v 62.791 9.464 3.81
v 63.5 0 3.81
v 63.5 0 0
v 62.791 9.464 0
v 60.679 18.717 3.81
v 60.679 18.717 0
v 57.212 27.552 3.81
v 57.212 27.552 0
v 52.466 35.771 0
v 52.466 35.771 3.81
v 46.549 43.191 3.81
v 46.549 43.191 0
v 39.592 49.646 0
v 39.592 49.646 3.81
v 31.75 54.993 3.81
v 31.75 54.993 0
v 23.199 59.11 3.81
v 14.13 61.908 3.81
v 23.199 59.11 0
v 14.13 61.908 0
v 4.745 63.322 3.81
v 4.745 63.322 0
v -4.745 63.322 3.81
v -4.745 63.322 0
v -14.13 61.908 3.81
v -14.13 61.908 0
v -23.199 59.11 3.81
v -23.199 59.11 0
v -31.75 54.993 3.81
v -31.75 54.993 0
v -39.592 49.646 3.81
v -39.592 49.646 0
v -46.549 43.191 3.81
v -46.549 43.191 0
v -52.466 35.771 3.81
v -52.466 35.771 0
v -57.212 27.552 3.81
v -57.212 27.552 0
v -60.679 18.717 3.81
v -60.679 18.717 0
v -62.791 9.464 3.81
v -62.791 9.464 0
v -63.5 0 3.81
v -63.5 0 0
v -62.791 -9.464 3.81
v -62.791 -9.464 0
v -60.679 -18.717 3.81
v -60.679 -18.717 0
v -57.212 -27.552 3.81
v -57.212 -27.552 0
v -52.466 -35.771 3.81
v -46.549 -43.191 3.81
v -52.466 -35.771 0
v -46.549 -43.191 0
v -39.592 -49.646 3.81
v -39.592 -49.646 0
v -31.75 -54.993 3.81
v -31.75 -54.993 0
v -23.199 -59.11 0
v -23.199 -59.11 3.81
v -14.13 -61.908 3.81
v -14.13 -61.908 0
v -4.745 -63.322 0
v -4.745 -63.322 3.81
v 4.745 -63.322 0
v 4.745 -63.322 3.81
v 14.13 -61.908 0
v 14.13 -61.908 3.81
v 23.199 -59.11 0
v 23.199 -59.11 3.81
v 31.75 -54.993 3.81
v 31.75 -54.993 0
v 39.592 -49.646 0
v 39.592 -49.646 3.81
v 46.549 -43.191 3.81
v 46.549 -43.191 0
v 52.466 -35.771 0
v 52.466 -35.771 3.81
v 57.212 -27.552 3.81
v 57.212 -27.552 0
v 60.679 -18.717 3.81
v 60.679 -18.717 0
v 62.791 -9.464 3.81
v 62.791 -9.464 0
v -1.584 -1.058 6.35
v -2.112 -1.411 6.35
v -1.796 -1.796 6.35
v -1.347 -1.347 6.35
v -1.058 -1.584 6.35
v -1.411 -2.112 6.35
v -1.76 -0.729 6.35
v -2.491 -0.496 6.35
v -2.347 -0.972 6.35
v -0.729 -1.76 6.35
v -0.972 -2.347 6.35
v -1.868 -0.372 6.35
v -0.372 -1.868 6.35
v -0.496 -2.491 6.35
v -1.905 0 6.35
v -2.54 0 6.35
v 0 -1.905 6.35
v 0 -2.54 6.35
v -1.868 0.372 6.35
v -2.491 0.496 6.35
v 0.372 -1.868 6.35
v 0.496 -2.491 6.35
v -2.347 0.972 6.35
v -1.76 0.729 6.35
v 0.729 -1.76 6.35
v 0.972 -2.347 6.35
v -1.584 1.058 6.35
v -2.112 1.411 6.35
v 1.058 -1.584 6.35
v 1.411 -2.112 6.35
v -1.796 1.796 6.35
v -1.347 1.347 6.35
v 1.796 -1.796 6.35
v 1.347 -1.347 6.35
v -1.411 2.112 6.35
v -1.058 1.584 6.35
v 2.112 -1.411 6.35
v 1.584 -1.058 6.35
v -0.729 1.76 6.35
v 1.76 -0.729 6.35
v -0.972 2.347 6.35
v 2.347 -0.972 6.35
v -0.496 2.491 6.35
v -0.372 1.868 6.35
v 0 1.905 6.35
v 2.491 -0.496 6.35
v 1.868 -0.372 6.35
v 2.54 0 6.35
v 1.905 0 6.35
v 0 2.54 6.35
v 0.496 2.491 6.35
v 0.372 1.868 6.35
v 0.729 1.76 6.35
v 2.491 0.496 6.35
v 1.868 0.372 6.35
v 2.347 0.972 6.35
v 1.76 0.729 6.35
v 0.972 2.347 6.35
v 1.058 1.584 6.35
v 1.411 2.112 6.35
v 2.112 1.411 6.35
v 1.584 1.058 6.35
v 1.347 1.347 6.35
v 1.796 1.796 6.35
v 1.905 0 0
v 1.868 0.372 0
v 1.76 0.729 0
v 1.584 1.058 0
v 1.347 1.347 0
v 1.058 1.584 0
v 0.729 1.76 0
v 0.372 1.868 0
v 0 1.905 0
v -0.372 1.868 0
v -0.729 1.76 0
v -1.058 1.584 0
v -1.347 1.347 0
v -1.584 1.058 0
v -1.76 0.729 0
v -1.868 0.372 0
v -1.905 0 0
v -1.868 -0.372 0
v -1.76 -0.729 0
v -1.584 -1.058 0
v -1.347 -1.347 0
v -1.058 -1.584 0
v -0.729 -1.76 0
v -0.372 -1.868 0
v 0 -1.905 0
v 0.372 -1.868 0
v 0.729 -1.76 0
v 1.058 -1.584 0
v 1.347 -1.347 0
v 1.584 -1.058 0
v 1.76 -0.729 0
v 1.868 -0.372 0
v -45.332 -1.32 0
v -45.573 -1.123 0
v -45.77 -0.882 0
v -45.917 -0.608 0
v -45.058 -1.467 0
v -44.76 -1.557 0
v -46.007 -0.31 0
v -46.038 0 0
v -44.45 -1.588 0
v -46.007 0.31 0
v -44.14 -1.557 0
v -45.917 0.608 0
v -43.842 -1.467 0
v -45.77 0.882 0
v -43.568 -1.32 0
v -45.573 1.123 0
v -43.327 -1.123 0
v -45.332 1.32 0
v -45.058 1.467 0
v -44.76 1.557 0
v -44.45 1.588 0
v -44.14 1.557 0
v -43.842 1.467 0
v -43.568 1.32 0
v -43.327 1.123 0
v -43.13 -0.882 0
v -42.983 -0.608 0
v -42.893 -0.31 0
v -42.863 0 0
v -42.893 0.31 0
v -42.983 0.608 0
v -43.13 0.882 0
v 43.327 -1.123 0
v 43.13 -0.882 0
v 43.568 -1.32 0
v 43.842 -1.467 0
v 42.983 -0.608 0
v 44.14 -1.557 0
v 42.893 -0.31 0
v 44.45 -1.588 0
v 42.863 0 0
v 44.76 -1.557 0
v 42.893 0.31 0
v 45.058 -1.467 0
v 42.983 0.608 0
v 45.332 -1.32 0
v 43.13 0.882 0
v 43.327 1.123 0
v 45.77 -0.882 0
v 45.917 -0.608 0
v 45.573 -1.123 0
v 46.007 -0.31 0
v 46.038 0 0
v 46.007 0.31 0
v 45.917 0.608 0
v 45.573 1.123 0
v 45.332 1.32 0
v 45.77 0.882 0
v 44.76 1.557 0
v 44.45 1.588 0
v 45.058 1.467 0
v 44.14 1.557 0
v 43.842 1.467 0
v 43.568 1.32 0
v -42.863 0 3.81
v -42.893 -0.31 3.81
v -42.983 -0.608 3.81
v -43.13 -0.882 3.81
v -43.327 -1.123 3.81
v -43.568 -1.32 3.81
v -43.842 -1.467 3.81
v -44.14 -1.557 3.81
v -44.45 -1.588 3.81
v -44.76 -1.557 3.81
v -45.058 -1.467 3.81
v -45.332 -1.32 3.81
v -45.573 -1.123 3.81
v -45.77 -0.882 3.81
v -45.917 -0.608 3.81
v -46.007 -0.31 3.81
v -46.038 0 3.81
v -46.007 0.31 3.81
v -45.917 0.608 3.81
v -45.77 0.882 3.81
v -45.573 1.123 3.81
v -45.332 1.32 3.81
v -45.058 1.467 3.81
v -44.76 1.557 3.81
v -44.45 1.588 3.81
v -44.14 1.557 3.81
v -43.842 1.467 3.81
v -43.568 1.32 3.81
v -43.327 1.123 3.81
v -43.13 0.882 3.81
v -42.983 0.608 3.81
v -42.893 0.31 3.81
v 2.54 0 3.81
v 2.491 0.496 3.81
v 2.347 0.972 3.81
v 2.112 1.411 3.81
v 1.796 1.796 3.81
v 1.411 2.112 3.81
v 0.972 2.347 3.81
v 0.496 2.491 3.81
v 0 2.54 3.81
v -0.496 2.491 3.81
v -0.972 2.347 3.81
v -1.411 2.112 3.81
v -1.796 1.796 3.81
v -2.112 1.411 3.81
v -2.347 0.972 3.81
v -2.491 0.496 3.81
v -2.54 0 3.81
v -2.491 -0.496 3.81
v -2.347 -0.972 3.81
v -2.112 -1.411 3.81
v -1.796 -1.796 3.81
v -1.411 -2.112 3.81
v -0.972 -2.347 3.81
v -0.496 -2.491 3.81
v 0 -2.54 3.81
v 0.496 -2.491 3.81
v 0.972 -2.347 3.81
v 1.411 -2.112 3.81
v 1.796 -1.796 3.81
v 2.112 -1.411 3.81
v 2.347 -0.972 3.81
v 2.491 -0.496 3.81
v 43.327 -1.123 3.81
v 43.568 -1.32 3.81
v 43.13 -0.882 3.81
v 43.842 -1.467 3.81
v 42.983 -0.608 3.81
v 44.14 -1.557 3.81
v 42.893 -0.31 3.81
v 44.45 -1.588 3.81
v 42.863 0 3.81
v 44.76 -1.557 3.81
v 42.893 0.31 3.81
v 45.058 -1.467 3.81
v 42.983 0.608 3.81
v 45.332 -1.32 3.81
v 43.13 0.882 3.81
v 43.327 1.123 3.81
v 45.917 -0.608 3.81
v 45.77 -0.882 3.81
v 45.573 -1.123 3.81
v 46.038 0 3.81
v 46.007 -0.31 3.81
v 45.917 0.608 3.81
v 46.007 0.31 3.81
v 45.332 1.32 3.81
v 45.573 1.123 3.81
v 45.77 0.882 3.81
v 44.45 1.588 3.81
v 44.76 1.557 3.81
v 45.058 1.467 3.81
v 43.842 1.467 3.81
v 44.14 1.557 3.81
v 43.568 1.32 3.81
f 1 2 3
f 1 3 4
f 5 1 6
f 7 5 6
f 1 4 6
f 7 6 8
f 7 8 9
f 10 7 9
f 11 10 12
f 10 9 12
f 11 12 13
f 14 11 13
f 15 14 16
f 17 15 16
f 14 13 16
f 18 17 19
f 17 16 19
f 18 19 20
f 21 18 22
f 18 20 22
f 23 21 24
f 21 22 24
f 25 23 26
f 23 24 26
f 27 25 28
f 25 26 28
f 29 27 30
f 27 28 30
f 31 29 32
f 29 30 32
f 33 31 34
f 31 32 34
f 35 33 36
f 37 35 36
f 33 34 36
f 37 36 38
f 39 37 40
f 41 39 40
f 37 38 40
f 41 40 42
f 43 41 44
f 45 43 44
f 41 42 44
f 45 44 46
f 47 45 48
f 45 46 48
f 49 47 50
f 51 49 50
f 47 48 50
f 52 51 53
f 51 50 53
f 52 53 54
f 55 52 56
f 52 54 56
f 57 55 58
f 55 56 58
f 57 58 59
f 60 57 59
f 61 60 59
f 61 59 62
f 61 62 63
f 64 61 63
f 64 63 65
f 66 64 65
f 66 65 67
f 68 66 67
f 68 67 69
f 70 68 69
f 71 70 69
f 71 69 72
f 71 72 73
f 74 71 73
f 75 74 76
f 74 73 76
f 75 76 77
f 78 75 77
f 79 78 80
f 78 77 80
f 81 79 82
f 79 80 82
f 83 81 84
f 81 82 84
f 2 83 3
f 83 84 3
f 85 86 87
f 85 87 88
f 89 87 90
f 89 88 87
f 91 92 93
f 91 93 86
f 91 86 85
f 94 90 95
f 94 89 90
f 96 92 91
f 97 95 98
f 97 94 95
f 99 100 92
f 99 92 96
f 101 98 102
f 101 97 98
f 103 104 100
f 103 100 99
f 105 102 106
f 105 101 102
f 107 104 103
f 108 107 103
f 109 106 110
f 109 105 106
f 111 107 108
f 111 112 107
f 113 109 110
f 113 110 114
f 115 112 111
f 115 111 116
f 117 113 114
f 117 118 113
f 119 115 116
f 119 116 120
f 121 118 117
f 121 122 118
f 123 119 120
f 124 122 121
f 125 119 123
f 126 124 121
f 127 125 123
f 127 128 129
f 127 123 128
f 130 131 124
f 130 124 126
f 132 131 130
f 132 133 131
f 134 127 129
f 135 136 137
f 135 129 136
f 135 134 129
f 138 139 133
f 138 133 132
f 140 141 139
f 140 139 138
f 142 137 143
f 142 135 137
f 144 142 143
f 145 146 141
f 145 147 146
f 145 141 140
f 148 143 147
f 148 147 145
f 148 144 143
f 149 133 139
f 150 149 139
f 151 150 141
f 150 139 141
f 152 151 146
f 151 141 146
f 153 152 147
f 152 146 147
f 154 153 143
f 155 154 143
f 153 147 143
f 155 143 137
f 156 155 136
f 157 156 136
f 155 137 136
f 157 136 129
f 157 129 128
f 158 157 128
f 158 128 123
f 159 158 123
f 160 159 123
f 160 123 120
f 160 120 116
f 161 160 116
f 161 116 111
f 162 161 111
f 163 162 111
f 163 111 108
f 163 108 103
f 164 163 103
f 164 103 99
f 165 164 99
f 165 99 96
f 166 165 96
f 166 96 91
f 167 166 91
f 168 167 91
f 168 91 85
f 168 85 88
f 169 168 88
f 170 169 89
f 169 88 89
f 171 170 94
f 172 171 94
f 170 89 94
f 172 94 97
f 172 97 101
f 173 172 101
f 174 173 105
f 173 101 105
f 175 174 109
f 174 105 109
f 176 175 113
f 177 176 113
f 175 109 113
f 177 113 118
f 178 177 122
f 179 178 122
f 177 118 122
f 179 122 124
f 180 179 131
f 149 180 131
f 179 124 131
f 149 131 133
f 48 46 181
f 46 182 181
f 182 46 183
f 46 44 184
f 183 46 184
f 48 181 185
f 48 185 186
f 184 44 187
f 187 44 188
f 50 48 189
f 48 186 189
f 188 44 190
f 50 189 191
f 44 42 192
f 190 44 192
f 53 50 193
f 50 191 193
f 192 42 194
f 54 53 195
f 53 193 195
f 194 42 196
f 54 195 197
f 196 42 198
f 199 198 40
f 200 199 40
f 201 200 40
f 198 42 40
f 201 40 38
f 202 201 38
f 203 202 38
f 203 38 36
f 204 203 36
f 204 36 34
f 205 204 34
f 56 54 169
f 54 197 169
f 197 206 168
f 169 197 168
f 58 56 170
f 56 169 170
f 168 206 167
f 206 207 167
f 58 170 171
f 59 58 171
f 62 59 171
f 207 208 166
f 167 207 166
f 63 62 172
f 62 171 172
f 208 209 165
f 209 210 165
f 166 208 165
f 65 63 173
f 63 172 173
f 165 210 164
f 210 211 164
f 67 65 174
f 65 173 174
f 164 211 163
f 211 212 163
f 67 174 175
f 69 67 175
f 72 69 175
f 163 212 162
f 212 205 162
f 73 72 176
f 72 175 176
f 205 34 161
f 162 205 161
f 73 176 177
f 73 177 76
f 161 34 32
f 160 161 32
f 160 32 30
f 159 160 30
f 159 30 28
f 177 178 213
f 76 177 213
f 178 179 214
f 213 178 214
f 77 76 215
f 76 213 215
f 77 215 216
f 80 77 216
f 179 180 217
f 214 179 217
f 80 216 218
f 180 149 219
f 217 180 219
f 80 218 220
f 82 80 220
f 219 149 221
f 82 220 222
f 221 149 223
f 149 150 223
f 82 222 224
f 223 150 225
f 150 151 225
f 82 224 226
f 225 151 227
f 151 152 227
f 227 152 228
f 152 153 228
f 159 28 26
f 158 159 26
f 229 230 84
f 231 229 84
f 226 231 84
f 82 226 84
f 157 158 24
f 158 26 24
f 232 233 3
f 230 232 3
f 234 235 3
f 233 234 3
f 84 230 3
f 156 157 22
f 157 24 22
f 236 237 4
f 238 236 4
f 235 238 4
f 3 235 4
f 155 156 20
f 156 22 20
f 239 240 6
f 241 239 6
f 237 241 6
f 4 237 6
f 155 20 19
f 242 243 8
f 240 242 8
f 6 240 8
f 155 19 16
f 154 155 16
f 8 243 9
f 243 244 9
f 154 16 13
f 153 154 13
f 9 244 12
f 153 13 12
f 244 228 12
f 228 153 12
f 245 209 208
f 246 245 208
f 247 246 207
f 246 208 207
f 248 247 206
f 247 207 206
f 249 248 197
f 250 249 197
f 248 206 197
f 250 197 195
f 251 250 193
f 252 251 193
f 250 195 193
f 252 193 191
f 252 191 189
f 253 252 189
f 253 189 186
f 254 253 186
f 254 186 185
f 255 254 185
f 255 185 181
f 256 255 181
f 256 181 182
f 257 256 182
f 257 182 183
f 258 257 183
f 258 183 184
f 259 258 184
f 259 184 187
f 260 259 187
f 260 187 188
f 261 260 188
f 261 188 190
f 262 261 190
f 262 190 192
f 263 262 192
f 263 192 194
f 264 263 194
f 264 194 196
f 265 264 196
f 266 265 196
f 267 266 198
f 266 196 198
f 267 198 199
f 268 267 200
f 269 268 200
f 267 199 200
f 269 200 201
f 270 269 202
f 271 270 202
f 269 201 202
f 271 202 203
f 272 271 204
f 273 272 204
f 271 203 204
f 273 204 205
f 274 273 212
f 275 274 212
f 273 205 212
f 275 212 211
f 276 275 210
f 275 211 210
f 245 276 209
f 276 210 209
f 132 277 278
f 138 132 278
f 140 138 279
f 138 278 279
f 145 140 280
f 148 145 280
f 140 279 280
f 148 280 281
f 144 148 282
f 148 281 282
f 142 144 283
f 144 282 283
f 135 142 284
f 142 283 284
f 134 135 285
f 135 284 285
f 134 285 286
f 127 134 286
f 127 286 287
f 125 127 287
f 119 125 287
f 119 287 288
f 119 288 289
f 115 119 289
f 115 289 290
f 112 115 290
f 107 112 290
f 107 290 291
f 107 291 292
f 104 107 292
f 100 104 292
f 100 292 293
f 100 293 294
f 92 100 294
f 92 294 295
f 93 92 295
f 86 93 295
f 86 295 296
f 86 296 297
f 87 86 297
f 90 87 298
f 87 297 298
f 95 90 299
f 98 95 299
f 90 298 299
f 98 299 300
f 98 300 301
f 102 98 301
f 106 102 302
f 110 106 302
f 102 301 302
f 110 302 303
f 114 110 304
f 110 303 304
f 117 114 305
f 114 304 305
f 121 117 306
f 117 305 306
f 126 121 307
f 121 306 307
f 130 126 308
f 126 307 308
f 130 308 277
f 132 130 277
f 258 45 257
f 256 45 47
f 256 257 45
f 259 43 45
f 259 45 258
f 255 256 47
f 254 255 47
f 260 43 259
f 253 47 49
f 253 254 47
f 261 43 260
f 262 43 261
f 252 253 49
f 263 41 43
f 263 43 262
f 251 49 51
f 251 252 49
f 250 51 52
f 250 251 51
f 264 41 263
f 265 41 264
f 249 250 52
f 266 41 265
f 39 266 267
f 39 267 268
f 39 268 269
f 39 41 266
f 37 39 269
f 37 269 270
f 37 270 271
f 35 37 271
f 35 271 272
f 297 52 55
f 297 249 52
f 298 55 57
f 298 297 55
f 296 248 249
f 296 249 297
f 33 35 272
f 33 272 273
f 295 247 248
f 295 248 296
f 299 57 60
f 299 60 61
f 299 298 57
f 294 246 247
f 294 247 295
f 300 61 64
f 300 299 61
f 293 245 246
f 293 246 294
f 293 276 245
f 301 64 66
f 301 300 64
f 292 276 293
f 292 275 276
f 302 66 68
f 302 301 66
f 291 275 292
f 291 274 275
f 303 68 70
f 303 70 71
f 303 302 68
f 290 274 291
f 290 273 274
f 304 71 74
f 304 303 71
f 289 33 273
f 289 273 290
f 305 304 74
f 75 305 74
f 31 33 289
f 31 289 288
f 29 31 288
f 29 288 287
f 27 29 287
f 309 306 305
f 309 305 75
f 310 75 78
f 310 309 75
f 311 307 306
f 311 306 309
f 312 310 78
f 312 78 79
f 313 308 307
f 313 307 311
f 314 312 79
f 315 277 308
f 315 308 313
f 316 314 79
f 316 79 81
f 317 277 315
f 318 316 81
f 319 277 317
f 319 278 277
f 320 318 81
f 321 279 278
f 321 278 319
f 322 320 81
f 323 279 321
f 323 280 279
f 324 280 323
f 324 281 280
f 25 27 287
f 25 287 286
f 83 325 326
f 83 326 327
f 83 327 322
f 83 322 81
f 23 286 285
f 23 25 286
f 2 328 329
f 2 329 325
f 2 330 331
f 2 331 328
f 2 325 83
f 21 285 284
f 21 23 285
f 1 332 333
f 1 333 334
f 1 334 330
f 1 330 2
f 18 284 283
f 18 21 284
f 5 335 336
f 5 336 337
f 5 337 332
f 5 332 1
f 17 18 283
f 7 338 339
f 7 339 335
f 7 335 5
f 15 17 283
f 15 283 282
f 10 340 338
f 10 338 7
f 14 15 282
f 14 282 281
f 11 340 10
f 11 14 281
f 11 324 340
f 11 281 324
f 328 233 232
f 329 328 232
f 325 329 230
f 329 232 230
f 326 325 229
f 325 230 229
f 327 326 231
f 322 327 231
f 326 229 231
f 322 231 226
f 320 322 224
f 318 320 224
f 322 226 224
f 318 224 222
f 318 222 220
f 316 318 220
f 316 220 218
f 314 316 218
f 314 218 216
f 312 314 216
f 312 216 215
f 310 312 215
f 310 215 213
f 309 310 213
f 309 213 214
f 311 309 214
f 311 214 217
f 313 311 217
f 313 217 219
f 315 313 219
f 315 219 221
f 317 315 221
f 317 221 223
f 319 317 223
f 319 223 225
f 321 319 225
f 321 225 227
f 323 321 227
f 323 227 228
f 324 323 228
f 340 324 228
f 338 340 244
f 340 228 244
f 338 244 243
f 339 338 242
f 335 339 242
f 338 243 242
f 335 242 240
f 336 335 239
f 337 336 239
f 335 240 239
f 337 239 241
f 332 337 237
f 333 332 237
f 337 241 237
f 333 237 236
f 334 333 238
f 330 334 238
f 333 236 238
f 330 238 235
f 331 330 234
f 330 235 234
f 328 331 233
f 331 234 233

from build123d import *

# Parameters (mm, degrees)
F0_R     = 2.54
F1_DEPTH = 6.35
F0_R_2   = 63.5
F2_DEPTH = 3.81
F3_R     = 1.905
F4_DEPTH = 40.64
F5_R     = 1.5875
F6_DEPTH = 25.4


with BuildPart() as f1:
    # F0 (on Top) → F1 (new body)
    with BuildSketch(Plane.XY):
        Circle(F0_R)
    extrude(amount=F1_DEPTH)

    # F0 (on Top) → F2 (join)
    with BuildSketch(Plane.XY):
        Circle(F0_R_2)
        Circle(F0_R, mode=Mode.SUBTRACT)
    extrude(amount=F2_DEPTH)

    # F3 (on face) → F4 (cut)
    with BuildSketch(Plane.XY.offset(6.35)):
        Circle(F3_R)
    extrude(amount=-F4_DEPTH, mode=Mode.SUBTRACT)

    # F5 (on face) → F6 (cut)
    with BuildSketch(Plane(origin=(0, 0, 0), x_dir=(1, 0, 0), z_dir=(0, 0, -1))):
        with Locations((44.45, 0)):
            Circle(F5_R)
        with Locations((-44.45, 0)):
            Circle(F5_R)
    extrude(amount=-F6_DEPTH, mode=Mode.SUBTRACT)


solid = f1.part
